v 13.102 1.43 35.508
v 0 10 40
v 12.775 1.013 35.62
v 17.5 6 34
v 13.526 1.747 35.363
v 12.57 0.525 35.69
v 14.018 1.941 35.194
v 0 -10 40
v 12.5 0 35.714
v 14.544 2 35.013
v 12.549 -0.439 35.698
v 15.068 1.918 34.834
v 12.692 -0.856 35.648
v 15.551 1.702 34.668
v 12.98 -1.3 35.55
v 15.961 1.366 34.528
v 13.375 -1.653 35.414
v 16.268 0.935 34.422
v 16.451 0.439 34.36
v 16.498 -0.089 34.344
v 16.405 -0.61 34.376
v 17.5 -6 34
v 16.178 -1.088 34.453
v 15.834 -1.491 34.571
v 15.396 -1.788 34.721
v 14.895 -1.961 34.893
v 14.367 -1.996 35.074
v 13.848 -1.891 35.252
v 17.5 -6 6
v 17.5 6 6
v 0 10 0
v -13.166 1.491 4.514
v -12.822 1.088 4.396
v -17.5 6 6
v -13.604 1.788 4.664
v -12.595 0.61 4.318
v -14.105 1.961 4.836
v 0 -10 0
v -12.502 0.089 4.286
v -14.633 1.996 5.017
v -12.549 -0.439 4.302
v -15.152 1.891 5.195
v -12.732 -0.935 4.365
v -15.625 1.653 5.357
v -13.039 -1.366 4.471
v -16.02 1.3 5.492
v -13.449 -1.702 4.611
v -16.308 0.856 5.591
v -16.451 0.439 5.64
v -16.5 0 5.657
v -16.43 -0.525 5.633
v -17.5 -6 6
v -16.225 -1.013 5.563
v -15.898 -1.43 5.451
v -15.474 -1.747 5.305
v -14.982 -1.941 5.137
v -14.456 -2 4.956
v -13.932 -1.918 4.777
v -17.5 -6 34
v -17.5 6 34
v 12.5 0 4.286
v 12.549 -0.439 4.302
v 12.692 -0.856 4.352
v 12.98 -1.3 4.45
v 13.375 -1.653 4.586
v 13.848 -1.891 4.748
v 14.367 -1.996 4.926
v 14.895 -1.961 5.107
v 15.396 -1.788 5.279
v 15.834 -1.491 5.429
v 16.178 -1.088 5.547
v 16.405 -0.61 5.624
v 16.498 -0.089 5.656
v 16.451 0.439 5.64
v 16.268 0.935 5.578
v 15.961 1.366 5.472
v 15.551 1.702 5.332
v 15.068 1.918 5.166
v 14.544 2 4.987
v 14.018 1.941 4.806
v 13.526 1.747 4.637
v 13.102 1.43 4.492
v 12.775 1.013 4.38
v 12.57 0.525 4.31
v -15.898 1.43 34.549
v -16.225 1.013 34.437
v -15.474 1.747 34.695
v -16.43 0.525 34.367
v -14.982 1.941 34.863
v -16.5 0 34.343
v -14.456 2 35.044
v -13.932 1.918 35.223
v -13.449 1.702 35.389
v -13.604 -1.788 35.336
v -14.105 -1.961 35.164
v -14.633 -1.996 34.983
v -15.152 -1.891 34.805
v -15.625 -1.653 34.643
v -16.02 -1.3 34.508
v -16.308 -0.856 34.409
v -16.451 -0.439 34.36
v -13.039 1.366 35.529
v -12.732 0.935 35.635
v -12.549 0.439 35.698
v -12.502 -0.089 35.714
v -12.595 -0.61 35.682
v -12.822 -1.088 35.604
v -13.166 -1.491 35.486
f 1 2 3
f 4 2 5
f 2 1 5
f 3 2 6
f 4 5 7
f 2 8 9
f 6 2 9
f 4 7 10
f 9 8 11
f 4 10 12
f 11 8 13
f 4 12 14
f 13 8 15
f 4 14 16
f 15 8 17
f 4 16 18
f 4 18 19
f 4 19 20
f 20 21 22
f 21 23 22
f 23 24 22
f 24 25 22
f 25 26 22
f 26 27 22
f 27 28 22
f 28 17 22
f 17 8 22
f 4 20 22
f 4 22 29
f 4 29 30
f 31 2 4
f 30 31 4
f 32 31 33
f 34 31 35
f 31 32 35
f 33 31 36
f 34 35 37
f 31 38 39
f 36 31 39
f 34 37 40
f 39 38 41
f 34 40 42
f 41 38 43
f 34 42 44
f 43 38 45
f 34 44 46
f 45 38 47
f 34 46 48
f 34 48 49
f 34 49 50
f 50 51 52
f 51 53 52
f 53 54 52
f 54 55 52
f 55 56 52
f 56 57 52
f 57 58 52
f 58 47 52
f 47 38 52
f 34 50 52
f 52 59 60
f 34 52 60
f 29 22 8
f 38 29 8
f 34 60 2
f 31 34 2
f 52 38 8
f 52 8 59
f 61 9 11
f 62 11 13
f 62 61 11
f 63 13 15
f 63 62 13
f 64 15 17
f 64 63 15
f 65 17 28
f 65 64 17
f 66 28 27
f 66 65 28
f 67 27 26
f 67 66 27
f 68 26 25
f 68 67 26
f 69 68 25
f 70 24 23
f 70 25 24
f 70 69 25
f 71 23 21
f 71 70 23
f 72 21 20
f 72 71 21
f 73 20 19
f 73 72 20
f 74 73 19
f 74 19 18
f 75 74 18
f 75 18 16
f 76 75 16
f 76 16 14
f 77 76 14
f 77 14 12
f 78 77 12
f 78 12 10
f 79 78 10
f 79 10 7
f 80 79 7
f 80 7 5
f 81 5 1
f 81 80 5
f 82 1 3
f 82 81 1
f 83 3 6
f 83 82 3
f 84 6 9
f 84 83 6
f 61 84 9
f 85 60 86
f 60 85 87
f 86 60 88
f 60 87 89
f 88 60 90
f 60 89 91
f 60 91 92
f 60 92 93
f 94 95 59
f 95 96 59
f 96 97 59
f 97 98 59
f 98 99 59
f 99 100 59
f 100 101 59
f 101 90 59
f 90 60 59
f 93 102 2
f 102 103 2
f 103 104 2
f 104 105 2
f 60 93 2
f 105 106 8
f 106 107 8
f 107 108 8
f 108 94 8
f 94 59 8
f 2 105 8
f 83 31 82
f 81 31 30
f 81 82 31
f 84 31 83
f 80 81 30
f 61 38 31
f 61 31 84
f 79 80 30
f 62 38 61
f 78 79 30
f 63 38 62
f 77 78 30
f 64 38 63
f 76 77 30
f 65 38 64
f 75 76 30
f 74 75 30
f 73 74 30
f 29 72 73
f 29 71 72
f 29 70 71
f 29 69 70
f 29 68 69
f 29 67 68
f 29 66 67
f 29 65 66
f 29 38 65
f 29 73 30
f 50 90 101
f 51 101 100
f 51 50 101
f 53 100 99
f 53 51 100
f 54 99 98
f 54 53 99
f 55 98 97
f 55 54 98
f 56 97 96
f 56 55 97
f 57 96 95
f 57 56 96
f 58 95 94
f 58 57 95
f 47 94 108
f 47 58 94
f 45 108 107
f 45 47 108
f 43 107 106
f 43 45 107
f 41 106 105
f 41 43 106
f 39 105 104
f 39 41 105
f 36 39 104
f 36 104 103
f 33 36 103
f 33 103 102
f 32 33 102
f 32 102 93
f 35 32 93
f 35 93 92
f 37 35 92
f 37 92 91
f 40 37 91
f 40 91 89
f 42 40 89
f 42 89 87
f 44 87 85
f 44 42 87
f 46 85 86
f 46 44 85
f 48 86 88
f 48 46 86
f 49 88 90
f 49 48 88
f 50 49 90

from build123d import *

# Parameters (mm, degrees)
SKETCH1_W               = 35
SKETCH1_H               = 20
BOSS_EXTRUDE1_DEPTH     = 40
CUT_EXTRUDE1_DEPTH      = 40
CUT_EXTRUDE2_DEPTH      = 45.791182168
CUT_EXTRUDE2_DEPTH_BACK = 45.791182168
SKETCH6_R               = 2
CUT_EXTRUDE3_DEPTH      = 45.791182168


with BuildPart() as part:
    # Sketch1 → Boss-Extrude1 (new body)
    with BuildSketch(Plane.XY):
        Rectangle(SKETCH1_W, SKETCH1_H)
    extrude(amount=BOSS_EXTRUDE1_DEPTH)

    # Sketch3 → Cut-Extrude1 (cut)
    with BuildSketch(Plane.XY.offset(40)):
        Polygon((-17.5, 10), (-17.5, 6), (0, 10), align=None)
        Polygon((17.5, 10), (0, 10), (17.5, 6), align=None)
        Polygon((17.5, -6), (0, -10), (17.5, -10), align=None)
        Polygon((0, -10), (-17.5, -6), (-17.5, -10), align=None)
    extrude(amount=-CUT_EXTRUDE1_DEPTH, mode=Mode.SUBTRACT)

    # Sketch5 → Cut-Extrude2 (cut, two sides: drawn at the far end of the back side and taken through both)
    with BuildSketch(Plane(origin=(0, 0, 0), x_dir=(1, 0, 0), z_dir=(0, 1, 0)).offset(-CUT_EXTRUDE2_DEPTH_BACK)):
        Polygon((-17.5, 0), (0, 0), (-17.5, -6), align=None)
        Polygon((17.5, -6), (17.5, 0), (0, 0), align=None)
        Polygon((17.5, -40), (0, -40), (17.5, -34), align=None)
        Polygon((-17.5, -40), (-17.5, -34), (0, -40), align=None)
    extrude(amount=CUT_EXTRUDE2_DEPTH + CUT_EXTRUDE2_DEPTH_BACK, mode=Mode.SUBTRACT)

    # Sketch6 → Cut-Extrude3 (cut, through all)
    with BuildSketch(Plane.XY):
        with Locations(Location((-14.5, 0, 0), (0, 0, 180))):
            Circle(SKETCH6_R)
        with Locations(Location((14.5, 0, 0), (0, 0, 180))):
            Circle(SKETCH6_R)
    extrude(amount=CUT_EXTRUDE3_DEPTH, mode=Mode.SUBTRACT)


solid = part.part
